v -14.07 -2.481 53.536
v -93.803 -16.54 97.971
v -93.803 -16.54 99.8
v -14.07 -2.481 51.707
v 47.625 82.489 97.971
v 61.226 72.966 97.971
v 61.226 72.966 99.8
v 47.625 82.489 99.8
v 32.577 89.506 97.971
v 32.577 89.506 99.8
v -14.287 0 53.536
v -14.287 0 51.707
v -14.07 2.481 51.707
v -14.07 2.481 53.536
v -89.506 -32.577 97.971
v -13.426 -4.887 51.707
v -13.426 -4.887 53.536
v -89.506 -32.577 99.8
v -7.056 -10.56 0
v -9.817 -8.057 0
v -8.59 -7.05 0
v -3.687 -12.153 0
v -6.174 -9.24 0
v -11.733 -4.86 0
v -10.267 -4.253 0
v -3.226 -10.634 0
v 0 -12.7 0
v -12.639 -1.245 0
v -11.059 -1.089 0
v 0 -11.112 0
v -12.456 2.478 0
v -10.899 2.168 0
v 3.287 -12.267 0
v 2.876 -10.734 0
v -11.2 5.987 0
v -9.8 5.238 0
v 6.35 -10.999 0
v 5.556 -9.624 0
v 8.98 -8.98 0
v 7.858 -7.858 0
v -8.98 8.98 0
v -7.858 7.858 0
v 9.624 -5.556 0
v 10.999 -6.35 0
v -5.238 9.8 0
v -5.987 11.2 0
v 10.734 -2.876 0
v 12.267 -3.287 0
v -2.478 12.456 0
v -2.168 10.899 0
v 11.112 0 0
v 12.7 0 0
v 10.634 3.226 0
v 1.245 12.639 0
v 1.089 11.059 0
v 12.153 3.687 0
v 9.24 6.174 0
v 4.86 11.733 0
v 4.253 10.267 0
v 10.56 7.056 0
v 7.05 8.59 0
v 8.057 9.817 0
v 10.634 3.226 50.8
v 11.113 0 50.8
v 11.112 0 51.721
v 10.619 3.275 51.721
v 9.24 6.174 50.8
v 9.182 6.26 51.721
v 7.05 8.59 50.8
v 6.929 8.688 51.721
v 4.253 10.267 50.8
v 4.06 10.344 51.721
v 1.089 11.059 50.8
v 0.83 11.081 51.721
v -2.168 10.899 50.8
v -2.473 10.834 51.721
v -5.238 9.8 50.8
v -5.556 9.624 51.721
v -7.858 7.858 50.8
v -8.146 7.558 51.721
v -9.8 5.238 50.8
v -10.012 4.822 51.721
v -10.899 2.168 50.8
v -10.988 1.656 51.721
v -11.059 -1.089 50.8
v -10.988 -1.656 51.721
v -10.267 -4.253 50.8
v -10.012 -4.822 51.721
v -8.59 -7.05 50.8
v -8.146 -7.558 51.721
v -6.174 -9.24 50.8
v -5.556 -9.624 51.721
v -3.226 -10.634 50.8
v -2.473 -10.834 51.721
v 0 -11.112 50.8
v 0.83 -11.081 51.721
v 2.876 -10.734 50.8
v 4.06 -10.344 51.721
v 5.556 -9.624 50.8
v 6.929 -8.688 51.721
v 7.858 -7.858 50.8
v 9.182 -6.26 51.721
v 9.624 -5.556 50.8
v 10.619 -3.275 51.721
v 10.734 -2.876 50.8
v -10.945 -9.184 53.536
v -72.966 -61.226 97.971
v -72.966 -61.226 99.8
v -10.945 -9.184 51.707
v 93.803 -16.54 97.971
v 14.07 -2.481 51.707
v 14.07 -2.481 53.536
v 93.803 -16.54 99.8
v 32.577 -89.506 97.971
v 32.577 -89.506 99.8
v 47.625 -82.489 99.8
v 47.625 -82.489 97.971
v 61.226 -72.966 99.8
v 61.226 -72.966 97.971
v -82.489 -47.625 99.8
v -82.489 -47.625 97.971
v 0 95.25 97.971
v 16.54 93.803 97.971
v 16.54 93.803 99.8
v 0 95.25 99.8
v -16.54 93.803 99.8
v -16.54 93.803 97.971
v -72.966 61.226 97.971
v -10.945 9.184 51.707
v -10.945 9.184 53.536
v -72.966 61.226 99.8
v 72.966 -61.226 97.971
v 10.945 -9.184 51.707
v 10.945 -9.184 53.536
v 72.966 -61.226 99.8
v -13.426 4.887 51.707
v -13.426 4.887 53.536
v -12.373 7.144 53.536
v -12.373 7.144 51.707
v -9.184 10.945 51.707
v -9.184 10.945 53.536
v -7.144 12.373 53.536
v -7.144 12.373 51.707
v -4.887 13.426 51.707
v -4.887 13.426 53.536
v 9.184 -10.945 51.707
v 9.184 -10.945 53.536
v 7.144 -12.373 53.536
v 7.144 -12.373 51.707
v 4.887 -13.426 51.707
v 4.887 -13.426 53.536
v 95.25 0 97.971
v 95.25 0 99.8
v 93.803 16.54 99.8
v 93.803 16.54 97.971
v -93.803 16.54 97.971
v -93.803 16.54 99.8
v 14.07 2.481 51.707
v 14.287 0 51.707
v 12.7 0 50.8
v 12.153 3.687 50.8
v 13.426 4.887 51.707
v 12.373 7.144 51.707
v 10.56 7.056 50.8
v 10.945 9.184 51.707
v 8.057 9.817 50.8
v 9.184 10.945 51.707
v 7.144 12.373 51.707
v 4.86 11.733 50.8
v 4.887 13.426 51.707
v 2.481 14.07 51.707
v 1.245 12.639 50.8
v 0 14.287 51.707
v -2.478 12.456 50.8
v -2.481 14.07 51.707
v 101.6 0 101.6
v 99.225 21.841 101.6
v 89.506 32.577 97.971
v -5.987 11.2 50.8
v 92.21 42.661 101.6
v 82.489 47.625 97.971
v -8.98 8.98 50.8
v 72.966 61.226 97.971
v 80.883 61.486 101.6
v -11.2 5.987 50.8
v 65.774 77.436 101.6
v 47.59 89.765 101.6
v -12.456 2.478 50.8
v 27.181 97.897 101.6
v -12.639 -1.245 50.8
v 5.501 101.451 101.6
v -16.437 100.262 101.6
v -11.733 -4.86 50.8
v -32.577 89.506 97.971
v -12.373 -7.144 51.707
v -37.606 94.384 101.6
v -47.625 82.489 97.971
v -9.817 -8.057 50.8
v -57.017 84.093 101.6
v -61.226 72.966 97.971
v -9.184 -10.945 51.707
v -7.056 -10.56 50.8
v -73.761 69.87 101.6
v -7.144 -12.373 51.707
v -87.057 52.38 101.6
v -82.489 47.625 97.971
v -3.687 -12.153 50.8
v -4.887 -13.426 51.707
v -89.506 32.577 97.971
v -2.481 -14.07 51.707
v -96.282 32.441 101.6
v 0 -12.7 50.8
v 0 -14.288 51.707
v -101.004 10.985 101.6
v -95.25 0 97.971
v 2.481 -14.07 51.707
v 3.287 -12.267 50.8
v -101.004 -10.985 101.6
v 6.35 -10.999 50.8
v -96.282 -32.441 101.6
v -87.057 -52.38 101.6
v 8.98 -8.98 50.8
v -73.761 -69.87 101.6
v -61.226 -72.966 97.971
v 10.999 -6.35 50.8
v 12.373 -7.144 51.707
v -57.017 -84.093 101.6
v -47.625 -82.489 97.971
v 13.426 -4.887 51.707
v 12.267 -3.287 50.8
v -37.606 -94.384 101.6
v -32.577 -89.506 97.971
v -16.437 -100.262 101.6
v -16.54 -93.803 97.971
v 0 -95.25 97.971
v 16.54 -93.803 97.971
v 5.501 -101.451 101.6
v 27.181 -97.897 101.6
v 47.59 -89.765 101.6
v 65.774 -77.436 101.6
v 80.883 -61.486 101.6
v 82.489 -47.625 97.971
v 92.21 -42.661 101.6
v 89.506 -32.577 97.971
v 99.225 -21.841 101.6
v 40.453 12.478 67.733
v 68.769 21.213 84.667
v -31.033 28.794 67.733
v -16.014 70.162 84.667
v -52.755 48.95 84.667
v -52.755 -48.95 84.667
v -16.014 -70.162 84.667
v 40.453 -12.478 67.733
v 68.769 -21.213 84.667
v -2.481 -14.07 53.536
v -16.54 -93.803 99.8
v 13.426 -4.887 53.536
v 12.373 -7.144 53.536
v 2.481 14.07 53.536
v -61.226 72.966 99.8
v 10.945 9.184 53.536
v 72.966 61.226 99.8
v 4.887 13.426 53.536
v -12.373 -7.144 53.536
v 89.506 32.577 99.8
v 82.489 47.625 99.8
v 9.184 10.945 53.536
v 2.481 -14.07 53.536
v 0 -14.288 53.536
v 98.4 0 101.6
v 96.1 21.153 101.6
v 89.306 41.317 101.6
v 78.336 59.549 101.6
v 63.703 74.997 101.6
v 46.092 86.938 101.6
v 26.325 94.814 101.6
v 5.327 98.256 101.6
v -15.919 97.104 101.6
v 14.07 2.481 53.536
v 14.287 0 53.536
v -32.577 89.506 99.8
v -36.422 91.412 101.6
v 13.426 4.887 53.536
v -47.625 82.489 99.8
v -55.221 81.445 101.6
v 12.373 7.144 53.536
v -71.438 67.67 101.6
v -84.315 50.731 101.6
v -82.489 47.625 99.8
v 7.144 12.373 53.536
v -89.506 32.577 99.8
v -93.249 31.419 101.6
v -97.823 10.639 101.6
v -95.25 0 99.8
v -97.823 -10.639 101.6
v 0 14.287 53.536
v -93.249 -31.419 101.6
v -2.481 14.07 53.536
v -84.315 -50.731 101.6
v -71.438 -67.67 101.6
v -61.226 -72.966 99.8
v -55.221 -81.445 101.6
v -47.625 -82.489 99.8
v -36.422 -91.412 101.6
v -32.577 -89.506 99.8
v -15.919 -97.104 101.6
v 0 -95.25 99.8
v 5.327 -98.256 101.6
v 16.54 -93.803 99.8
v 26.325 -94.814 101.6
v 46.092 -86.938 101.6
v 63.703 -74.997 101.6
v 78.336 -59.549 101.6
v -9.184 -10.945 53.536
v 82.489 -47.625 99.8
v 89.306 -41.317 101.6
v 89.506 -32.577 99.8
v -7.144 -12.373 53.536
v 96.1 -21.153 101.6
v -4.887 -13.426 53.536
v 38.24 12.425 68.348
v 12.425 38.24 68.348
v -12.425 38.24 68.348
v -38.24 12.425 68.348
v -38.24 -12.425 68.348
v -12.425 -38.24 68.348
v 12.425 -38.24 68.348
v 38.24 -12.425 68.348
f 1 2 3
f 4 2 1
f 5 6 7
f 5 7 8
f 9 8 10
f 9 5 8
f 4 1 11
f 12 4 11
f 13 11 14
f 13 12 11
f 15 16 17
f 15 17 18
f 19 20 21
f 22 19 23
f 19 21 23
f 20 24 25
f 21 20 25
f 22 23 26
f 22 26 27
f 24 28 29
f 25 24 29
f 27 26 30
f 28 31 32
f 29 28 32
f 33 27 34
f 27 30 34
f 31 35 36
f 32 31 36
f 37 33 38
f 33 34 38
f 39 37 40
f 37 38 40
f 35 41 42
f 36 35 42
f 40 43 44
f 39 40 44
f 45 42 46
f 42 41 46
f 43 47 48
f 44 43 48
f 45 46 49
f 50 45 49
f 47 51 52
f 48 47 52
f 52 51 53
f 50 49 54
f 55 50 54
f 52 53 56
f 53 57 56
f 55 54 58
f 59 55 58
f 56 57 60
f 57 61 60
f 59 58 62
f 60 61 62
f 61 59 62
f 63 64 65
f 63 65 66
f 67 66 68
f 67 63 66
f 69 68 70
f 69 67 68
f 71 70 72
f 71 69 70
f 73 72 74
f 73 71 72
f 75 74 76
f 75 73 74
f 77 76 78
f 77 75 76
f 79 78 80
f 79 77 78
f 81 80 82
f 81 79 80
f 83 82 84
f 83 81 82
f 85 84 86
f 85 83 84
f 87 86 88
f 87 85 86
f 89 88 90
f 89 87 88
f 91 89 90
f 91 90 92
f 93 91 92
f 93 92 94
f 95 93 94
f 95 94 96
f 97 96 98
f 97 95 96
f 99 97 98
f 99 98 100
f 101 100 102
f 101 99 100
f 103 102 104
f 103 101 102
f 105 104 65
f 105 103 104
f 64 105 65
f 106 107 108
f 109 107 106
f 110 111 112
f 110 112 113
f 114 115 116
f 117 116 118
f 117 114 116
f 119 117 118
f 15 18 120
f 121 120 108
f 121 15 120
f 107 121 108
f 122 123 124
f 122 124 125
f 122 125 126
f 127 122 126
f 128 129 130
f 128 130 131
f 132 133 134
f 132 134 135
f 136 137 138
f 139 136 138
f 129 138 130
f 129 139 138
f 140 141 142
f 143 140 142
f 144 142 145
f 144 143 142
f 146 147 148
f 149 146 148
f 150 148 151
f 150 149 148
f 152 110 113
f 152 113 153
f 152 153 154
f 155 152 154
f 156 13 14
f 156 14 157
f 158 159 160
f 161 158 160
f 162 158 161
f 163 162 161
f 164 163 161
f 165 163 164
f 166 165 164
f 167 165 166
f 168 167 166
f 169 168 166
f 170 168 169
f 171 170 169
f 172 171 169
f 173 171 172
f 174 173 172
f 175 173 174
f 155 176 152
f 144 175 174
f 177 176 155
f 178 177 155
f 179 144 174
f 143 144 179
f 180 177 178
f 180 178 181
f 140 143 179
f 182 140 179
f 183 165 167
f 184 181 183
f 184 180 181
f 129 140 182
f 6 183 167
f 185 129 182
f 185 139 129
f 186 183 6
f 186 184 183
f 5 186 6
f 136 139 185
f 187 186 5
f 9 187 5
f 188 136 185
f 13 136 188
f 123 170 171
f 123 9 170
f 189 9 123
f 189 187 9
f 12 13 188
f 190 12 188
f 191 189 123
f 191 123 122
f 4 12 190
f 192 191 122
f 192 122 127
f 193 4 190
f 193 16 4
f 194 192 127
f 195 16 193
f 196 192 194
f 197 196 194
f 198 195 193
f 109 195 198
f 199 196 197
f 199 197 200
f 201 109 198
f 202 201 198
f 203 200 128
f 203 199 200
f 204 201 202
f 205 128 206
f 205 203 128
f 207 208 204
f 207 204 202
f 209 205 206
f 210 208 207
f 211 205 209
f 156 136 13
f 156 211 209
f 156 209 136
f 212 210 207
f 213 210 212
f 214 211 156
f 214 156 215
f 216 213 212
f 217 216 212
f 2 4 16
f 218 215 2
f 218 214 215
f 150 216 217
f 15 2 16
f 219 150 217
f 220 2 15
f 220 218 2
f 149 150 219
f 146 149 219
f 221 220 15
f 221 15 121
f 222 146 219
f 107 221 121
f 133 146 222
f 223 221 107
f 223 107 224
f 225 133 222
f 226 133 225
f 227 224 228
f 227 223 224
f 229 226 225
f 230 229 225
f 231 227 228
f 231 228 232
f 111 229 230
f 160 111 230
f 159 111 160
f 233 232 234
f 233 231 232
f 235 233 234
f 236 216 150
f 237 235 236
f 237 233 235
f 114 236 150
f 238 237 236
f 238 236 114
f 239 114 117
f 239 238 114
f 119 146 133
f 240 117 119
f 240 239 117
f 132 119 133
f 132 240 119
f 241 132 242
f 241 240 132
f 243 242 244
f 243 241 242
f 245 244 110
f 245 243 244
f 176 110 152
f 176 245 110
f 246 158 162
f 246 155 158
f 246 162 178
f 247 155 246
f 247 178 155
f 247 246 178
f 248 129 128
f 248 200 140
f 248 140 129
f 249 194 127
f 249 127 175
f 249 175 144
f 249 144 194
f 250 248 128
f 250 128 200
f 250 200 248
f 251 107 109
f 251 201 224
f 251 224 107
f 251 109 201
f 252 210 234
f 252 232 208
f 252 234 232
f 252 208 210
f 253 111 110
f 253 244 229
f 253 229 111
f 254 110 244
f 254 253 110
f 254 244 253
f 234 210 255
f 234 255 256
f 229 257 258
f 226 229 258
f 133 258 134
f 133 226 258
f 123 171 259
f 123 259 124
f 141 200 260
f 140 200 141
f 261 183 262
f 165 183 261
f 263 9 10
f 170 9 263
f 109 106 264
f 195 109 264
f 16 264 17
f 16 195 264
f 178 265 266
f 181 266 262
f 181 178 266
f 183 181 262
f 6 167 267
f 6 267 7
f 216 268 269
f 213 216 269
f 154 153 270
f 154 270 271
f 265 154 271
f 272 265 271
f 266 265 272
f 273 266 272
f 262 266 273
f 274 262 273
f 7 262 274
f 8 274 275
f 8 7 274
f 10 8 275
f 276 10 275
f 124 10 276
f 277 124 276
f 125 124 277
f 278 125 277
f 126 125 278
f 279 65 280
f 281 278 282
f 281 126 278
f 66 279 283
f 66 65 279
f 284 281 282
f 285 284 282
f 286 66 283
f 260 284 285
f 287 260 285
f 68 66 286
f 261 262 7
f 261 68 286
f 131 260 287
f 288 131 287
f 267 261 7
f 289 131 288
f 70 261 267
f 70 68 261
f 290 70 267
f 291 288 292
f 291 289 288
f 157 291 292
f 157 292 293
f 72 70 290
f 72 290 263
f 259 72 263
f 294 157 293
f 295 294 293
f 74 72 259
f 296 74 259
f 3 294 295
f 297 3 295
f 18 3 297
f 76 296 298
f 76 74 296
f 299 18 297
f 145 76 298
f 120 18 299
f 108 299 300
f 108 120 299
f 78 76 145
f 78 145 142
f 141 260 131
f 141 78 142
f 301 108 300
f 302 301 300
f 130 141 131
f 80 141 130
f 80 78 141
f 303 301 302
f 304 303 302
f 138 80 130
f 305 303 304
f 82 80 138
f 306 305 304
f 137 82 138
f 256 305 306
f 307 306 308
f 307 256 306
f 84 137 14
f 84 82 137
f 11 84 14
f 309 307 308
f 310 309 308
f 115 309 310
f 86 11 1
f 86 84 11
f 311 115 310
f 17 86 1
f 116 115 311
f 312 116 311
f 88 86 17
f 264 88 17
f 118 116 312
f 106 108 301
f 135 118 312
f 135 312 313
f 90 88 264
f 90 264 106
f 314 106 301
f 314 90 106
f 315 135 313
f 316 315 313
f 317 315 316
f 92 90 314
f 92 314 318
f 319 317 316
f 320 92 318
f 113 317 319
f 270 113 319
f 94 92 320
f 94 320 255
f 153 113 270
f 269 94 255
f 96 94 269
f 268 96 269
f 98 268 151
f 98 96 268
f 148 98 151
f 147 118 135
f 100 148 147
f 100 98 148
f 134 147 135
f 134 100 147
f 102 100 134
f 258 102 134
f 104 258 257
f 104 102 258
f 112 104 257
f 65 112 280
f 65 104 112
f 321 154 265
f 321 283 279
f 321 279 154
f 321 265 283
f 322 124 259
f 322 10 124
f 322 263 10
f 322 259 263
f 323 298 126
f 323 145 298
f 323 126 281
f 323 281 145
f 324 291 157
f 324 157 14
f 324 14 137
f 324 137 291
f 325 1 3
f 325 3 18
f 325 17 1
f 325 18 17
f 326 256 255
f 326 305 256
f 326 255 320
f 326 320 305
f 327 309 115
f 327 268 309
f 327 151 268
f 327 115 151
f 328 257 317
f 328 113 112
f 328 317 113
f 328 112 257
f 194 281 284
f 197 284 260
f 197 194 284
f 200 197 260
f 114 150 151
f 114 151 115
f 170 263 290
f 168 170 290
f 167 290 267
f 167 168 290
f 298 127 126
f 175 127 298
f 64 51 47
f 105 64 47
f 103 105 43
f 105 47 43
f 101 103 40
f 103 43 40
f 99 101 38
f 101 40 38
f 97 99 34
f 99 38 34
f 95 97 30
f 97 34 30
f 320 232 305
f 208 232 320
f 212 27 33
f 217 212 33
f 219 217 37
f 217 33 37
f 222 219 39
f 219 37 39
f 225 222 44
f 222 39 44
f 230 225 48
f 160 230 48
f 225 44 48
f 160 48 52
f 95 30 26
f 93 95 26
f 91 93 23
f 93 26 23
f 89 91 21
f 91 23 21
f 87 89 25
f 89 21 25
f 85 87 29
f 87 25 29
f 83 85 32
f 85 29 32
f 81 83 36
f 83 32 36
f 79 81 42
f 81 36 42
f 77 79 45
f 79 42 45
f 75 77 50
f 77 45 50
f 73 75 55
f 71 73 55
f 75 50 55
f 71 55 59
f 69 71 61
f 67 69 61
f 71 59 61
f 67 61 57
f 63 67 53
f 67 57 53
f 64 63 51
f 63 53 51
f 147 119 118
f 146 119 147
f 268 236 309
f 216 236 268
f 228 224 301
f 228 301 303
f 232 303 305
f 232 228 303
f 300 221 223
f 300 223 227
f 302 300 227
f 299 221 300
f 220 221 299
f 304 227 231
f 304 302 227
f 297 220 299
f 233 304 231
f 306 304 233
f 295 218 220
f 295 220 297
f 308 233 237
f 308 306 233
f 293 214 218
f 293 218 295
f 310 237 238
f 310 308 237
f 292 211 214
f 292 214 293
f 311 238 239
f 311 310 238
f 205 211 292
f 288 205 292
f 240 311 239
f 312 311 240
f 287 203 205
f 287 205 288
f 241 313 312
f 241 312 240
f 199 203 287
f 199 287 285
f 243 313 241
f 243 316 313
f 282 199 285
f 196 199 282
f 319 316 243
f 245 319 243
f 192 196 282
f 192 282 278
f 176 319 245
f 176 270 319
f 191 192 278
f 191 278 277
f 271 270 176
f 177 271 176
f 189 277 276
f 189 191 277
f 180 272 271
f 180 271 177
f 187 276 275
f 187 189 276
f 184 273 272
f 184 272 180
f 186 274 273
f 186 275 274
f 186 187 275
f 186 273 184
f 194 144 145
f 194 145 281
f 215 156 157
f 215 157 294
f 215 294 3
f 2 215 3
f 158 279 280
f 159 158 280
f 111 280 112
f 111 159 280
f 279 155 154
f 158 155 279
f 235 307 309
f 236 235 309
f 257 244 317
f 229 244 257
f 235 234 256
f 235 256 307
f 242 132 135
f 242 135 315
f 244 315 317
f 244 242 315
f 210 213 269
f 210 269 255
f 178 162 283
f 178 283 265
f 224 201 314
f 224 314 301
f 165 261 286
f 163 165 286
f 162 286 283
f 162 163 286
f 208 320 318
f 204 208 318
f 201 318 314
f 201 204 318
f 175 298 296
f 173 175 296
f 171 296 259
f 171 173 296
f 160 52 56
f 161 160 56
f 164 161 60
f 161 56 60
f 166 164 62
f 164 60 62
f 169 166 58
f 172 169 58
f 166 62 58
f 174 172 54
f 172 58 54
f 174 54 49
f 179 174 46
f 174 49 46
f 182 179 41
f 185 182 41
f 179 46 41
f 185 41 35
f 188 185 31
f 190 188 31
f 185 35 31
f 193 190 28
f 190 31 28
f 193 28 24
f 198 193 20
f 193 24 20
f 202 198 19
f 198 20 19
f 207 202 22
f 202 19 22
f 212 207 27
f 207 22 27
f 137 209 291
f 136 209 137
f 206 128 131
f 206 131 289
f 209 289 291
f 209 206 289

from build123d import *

# Parameters (mm, degrees)
F1_DEPTH = 50.8
F4_DEPTH = 152.4


with BuildPart() as f1:
    # F0 (on Top) → F1 (new body)
    with BuildSketch(Plane.XY):
        with BuildLine():
            ThreePointArc((12.7, 0), (-8.9802561211, 8.9802561211), (0, -12.7))
            ThreePointArc((0, -12.7), (8.9802561211, -8.9802561211), (12.7, 0))
        make_face()
        with BuildLine():
            ThreePointArc((0, -11.1125), (-7.8577241059, 7.8577241059), (11.1125, 0))
            ThreePointArc((11.1125, 0), (7.8577241059, -7.8577241059), (0, -11.1125))
        make_face(mode=Mode.SUBTRACT)
    extrude(amount=F1_DEPTH)

    # F2 (on Front) → F3 (revolve)
    with BuildSketch(Plane.XZ):
        Polygon((11.1125, 51.7212620251), (11.1125, 50.8), (12.7, 50.8), (101.6, 101.6), (98.4002914561, 101.6), align=None)
    revolve(axis=Axis((0, 0, 76.2), (0, 0, 1)))

    # F0 (on Top) → F4 (cut)
    with BuildSketch(Plane.XY):
        with BuildLine():
            Line((72.9657332071, 61.2255198226), (10.9448599811, 9.1838279734))
            ThreePointArc((10.9448599811, 9.1838279734), (12.3733379566, 7.14375), (13.4258583195, 4.8866127978))
            Line((13.4258583195, 4.8866127978), (89.5057221299, 32.5774186518))
            ThreePointArc((89.5057221299, 32.5774186518), (82.4889197105, 47.625), (72.9657332071, 61.2255198226))
        make_face()
        with BuildLine():
            Line((93.8029384744, 16.5399889228), (14.0704407712, 2.4809983384))
            ThreePointArc((14.0704407712, 2.4809983384), (14.2875, 0), (14.0704407712, -2.4809983384))
            Line((14.0704407712, -2.4809983384), (93.8029384744, -16.5399889228))
            ThreePointArc((93.8029384744, -16.5399889228), (95.25, 0), (93.8029384744, 16.5399889228))
        make_face()
        with BuildLine():
            Line((32.5774186518, 89.5057221299), (4.8866127978, 13.4258583195))
            ThreePointArc((4.8866127978, 13.4258583195), (7.14375, 12.3733379566), (9.1838279734, 10.9448599811))
            Line((9.1838279734, 10.9448599811), (61.2255198226, 72.9657332071))
            ThreePointArc((61.2255198226, 72.9657332071), (47.625, 82.4889197105), (32.5774186518, 89.5057221299))
        make_face()
        with BuildLine():
            Line((0, -95.25), (0, -14.2875))
            ThreePointArc((0, -14.2875), (-1.2452376745, -14.233131749), (-2.4809983384, -14.0704407712))
            Line((-2.4809983384, -14.0704407712), (-16.5399889228, -93.8029384744))
            ThreePointArc((-16.5399889228, -93.8029384744), (-8.3015844967, -94.8875449932), (0, -95.25))
        make_face()
        with BuildLine():
            ThreePointArc((2.4809983384, -14.0704407712), (1.2452376745, -14.233131749), (0, -14.2875))
            Line((0, -14.2875), (0, -95.25))
            ThreePointArc((0, -95.25), (8.3015844967, -94.8875449932), (16.5399889228, -93.8029384744))
            Line((16.5399889228, -93.8029384744), (2.4809983384, -14.0704407712))
        make_face()
        with BuildLine():
            Line((61.2255198226, -72.9657332071), (9.1838279734, -10.9448599811))
            ThreePointArc((9.1838279734, -10.9448599811), (7.14375, -12.3733379566), (4.8866127978, -13.4258583195))
            Line((4.8866127978, -13.4258583195), (32.5774186518, -89.5057221299))
            ThreePointArc((32.5774186518, -89.5057221299), (47.625, -82.4889197105), (61.2255198226, -72.9657332071))
        make_face()
        with BuildLine():
            Line((89.5057221299, -32.5774186518), (13.4258583195, -4.8866127978))
            ThreePointArc((13.4258583195, -4.8866127978), (12.3733379566, -7.14375), (10.9448599811, -9.1838279734))
            Line((10.9448599811, -9.1838279734), (72.9657332071, -61.2255198226))
            ThreePointArc((72.9657332071, -61.2255198226), (82.4889197105, -47.625), (89.5057221299, -32.5774186518))
        make_face()
        with BuildLine():
            Line((-32.5774186518, -89.5057221299), (-4.8866127978, -13.4258583195))
            ThreePointArc((-4.8866127978, -13.4258583195), (-7.14375, -12.3733379566), (-9.1838279734, -10.9448599811))
            Line((-9.1838279734, -10.9448599811), (-61.2255198226, -72.9657332071))
            ThreePointArc((-61.2255198226, -72.9657332071), (-47.625, -82.4889197105), (-32.5774186518, -89.5057221299))
        make_face()
        with BuildLine():
            Line((-72.9657332071, -61.2255198226), (-10.9448599811, -9.1838279734))
            ThreePointArc((-10.9448599811, -9.1838279734), (-12.3733379566, -7.14375), (-13.4258583195, -4.8866127978))
            Line((-13.4258583195, -4.8866127978), (-89.5057221299, -32.5774186518))
            ThreePointArc((-89.5057221299, -32.5774186518), (-82.4889197105, -47.625), (-72.9657332071, -61.2255198226))
        make_face()
        with BuildLine():
            Line((-93.8029384744, -16.5399889228), (-14.0704407712, -2.4809983384))
            ThreePointArc((-14.0704407712, -2.4809983384), (-14.2875, 0), (-14.0704407712, 2.4809983384))
            Line((-14.0704407712, 2.4809983384), (-93.8029384744, 16.5399889228))
            ThreePointArc((-93.8029384744, 16.5399889228), (-95.25, 0), (-93.8029384744, -16.5399889228))
        make_face()
        with BuildLine():
            Line((-89.5057221299, 32.5774186518), (-13.4258583195, 4.8866127978))
            ThreePointArc((-13.4258583195, 4.8866127978), (-12.3733379566, 7.14375), (-10.9448599811, 9.1838279734))
            Line((-10.9448599811, 9.1838279734), (-72.9657332071, 61.2255198226))
            ThreePointArc((-72.9657332071, 61.2255198226), (-82.4889197105, 47.625), (-89.5057221299, 32.5774186518))
        make_face()
        with BuildLine():
            Line((-16.5399889228, 93.8029384744), (-2.4809983384, 14.0704407712))
            ThreePointArc((-2.4809983384, 14.0704407712), (0, 14.2875), (2.4809983384, 14.0704407712))
            Line((2.4809983384, 14.0704407712), (16.5399889228, 93.8029384744))
            ThreePointArc((16.5399889228, 93.8029384744), (0, 95.25), (-16.5399889228, 93.8029384744))
        make_face()
        with BuildLine():
            Line((-61.2255198226, 72.9657332071), (-9.1838279734, 10.9448599811))
            ThreePointArc((-9.1838279734, 10.9448599811), (-7.14375, 12.3733379566), (-4.8866127978, 13.4258583195))
            Line((-4.8866127978, 13.4258583195), (-32.5774186518, 89.5057221299))
            ThreePointArc((-32.5774186518, 89.5057221299), (-47.625, 82.4889197105), (-61.2255198226, 72.9657332071))
        make_face()
    extrude(amount=F4_DEPTH, mode=Mode.SUBTRACT)


solid = f1.part
